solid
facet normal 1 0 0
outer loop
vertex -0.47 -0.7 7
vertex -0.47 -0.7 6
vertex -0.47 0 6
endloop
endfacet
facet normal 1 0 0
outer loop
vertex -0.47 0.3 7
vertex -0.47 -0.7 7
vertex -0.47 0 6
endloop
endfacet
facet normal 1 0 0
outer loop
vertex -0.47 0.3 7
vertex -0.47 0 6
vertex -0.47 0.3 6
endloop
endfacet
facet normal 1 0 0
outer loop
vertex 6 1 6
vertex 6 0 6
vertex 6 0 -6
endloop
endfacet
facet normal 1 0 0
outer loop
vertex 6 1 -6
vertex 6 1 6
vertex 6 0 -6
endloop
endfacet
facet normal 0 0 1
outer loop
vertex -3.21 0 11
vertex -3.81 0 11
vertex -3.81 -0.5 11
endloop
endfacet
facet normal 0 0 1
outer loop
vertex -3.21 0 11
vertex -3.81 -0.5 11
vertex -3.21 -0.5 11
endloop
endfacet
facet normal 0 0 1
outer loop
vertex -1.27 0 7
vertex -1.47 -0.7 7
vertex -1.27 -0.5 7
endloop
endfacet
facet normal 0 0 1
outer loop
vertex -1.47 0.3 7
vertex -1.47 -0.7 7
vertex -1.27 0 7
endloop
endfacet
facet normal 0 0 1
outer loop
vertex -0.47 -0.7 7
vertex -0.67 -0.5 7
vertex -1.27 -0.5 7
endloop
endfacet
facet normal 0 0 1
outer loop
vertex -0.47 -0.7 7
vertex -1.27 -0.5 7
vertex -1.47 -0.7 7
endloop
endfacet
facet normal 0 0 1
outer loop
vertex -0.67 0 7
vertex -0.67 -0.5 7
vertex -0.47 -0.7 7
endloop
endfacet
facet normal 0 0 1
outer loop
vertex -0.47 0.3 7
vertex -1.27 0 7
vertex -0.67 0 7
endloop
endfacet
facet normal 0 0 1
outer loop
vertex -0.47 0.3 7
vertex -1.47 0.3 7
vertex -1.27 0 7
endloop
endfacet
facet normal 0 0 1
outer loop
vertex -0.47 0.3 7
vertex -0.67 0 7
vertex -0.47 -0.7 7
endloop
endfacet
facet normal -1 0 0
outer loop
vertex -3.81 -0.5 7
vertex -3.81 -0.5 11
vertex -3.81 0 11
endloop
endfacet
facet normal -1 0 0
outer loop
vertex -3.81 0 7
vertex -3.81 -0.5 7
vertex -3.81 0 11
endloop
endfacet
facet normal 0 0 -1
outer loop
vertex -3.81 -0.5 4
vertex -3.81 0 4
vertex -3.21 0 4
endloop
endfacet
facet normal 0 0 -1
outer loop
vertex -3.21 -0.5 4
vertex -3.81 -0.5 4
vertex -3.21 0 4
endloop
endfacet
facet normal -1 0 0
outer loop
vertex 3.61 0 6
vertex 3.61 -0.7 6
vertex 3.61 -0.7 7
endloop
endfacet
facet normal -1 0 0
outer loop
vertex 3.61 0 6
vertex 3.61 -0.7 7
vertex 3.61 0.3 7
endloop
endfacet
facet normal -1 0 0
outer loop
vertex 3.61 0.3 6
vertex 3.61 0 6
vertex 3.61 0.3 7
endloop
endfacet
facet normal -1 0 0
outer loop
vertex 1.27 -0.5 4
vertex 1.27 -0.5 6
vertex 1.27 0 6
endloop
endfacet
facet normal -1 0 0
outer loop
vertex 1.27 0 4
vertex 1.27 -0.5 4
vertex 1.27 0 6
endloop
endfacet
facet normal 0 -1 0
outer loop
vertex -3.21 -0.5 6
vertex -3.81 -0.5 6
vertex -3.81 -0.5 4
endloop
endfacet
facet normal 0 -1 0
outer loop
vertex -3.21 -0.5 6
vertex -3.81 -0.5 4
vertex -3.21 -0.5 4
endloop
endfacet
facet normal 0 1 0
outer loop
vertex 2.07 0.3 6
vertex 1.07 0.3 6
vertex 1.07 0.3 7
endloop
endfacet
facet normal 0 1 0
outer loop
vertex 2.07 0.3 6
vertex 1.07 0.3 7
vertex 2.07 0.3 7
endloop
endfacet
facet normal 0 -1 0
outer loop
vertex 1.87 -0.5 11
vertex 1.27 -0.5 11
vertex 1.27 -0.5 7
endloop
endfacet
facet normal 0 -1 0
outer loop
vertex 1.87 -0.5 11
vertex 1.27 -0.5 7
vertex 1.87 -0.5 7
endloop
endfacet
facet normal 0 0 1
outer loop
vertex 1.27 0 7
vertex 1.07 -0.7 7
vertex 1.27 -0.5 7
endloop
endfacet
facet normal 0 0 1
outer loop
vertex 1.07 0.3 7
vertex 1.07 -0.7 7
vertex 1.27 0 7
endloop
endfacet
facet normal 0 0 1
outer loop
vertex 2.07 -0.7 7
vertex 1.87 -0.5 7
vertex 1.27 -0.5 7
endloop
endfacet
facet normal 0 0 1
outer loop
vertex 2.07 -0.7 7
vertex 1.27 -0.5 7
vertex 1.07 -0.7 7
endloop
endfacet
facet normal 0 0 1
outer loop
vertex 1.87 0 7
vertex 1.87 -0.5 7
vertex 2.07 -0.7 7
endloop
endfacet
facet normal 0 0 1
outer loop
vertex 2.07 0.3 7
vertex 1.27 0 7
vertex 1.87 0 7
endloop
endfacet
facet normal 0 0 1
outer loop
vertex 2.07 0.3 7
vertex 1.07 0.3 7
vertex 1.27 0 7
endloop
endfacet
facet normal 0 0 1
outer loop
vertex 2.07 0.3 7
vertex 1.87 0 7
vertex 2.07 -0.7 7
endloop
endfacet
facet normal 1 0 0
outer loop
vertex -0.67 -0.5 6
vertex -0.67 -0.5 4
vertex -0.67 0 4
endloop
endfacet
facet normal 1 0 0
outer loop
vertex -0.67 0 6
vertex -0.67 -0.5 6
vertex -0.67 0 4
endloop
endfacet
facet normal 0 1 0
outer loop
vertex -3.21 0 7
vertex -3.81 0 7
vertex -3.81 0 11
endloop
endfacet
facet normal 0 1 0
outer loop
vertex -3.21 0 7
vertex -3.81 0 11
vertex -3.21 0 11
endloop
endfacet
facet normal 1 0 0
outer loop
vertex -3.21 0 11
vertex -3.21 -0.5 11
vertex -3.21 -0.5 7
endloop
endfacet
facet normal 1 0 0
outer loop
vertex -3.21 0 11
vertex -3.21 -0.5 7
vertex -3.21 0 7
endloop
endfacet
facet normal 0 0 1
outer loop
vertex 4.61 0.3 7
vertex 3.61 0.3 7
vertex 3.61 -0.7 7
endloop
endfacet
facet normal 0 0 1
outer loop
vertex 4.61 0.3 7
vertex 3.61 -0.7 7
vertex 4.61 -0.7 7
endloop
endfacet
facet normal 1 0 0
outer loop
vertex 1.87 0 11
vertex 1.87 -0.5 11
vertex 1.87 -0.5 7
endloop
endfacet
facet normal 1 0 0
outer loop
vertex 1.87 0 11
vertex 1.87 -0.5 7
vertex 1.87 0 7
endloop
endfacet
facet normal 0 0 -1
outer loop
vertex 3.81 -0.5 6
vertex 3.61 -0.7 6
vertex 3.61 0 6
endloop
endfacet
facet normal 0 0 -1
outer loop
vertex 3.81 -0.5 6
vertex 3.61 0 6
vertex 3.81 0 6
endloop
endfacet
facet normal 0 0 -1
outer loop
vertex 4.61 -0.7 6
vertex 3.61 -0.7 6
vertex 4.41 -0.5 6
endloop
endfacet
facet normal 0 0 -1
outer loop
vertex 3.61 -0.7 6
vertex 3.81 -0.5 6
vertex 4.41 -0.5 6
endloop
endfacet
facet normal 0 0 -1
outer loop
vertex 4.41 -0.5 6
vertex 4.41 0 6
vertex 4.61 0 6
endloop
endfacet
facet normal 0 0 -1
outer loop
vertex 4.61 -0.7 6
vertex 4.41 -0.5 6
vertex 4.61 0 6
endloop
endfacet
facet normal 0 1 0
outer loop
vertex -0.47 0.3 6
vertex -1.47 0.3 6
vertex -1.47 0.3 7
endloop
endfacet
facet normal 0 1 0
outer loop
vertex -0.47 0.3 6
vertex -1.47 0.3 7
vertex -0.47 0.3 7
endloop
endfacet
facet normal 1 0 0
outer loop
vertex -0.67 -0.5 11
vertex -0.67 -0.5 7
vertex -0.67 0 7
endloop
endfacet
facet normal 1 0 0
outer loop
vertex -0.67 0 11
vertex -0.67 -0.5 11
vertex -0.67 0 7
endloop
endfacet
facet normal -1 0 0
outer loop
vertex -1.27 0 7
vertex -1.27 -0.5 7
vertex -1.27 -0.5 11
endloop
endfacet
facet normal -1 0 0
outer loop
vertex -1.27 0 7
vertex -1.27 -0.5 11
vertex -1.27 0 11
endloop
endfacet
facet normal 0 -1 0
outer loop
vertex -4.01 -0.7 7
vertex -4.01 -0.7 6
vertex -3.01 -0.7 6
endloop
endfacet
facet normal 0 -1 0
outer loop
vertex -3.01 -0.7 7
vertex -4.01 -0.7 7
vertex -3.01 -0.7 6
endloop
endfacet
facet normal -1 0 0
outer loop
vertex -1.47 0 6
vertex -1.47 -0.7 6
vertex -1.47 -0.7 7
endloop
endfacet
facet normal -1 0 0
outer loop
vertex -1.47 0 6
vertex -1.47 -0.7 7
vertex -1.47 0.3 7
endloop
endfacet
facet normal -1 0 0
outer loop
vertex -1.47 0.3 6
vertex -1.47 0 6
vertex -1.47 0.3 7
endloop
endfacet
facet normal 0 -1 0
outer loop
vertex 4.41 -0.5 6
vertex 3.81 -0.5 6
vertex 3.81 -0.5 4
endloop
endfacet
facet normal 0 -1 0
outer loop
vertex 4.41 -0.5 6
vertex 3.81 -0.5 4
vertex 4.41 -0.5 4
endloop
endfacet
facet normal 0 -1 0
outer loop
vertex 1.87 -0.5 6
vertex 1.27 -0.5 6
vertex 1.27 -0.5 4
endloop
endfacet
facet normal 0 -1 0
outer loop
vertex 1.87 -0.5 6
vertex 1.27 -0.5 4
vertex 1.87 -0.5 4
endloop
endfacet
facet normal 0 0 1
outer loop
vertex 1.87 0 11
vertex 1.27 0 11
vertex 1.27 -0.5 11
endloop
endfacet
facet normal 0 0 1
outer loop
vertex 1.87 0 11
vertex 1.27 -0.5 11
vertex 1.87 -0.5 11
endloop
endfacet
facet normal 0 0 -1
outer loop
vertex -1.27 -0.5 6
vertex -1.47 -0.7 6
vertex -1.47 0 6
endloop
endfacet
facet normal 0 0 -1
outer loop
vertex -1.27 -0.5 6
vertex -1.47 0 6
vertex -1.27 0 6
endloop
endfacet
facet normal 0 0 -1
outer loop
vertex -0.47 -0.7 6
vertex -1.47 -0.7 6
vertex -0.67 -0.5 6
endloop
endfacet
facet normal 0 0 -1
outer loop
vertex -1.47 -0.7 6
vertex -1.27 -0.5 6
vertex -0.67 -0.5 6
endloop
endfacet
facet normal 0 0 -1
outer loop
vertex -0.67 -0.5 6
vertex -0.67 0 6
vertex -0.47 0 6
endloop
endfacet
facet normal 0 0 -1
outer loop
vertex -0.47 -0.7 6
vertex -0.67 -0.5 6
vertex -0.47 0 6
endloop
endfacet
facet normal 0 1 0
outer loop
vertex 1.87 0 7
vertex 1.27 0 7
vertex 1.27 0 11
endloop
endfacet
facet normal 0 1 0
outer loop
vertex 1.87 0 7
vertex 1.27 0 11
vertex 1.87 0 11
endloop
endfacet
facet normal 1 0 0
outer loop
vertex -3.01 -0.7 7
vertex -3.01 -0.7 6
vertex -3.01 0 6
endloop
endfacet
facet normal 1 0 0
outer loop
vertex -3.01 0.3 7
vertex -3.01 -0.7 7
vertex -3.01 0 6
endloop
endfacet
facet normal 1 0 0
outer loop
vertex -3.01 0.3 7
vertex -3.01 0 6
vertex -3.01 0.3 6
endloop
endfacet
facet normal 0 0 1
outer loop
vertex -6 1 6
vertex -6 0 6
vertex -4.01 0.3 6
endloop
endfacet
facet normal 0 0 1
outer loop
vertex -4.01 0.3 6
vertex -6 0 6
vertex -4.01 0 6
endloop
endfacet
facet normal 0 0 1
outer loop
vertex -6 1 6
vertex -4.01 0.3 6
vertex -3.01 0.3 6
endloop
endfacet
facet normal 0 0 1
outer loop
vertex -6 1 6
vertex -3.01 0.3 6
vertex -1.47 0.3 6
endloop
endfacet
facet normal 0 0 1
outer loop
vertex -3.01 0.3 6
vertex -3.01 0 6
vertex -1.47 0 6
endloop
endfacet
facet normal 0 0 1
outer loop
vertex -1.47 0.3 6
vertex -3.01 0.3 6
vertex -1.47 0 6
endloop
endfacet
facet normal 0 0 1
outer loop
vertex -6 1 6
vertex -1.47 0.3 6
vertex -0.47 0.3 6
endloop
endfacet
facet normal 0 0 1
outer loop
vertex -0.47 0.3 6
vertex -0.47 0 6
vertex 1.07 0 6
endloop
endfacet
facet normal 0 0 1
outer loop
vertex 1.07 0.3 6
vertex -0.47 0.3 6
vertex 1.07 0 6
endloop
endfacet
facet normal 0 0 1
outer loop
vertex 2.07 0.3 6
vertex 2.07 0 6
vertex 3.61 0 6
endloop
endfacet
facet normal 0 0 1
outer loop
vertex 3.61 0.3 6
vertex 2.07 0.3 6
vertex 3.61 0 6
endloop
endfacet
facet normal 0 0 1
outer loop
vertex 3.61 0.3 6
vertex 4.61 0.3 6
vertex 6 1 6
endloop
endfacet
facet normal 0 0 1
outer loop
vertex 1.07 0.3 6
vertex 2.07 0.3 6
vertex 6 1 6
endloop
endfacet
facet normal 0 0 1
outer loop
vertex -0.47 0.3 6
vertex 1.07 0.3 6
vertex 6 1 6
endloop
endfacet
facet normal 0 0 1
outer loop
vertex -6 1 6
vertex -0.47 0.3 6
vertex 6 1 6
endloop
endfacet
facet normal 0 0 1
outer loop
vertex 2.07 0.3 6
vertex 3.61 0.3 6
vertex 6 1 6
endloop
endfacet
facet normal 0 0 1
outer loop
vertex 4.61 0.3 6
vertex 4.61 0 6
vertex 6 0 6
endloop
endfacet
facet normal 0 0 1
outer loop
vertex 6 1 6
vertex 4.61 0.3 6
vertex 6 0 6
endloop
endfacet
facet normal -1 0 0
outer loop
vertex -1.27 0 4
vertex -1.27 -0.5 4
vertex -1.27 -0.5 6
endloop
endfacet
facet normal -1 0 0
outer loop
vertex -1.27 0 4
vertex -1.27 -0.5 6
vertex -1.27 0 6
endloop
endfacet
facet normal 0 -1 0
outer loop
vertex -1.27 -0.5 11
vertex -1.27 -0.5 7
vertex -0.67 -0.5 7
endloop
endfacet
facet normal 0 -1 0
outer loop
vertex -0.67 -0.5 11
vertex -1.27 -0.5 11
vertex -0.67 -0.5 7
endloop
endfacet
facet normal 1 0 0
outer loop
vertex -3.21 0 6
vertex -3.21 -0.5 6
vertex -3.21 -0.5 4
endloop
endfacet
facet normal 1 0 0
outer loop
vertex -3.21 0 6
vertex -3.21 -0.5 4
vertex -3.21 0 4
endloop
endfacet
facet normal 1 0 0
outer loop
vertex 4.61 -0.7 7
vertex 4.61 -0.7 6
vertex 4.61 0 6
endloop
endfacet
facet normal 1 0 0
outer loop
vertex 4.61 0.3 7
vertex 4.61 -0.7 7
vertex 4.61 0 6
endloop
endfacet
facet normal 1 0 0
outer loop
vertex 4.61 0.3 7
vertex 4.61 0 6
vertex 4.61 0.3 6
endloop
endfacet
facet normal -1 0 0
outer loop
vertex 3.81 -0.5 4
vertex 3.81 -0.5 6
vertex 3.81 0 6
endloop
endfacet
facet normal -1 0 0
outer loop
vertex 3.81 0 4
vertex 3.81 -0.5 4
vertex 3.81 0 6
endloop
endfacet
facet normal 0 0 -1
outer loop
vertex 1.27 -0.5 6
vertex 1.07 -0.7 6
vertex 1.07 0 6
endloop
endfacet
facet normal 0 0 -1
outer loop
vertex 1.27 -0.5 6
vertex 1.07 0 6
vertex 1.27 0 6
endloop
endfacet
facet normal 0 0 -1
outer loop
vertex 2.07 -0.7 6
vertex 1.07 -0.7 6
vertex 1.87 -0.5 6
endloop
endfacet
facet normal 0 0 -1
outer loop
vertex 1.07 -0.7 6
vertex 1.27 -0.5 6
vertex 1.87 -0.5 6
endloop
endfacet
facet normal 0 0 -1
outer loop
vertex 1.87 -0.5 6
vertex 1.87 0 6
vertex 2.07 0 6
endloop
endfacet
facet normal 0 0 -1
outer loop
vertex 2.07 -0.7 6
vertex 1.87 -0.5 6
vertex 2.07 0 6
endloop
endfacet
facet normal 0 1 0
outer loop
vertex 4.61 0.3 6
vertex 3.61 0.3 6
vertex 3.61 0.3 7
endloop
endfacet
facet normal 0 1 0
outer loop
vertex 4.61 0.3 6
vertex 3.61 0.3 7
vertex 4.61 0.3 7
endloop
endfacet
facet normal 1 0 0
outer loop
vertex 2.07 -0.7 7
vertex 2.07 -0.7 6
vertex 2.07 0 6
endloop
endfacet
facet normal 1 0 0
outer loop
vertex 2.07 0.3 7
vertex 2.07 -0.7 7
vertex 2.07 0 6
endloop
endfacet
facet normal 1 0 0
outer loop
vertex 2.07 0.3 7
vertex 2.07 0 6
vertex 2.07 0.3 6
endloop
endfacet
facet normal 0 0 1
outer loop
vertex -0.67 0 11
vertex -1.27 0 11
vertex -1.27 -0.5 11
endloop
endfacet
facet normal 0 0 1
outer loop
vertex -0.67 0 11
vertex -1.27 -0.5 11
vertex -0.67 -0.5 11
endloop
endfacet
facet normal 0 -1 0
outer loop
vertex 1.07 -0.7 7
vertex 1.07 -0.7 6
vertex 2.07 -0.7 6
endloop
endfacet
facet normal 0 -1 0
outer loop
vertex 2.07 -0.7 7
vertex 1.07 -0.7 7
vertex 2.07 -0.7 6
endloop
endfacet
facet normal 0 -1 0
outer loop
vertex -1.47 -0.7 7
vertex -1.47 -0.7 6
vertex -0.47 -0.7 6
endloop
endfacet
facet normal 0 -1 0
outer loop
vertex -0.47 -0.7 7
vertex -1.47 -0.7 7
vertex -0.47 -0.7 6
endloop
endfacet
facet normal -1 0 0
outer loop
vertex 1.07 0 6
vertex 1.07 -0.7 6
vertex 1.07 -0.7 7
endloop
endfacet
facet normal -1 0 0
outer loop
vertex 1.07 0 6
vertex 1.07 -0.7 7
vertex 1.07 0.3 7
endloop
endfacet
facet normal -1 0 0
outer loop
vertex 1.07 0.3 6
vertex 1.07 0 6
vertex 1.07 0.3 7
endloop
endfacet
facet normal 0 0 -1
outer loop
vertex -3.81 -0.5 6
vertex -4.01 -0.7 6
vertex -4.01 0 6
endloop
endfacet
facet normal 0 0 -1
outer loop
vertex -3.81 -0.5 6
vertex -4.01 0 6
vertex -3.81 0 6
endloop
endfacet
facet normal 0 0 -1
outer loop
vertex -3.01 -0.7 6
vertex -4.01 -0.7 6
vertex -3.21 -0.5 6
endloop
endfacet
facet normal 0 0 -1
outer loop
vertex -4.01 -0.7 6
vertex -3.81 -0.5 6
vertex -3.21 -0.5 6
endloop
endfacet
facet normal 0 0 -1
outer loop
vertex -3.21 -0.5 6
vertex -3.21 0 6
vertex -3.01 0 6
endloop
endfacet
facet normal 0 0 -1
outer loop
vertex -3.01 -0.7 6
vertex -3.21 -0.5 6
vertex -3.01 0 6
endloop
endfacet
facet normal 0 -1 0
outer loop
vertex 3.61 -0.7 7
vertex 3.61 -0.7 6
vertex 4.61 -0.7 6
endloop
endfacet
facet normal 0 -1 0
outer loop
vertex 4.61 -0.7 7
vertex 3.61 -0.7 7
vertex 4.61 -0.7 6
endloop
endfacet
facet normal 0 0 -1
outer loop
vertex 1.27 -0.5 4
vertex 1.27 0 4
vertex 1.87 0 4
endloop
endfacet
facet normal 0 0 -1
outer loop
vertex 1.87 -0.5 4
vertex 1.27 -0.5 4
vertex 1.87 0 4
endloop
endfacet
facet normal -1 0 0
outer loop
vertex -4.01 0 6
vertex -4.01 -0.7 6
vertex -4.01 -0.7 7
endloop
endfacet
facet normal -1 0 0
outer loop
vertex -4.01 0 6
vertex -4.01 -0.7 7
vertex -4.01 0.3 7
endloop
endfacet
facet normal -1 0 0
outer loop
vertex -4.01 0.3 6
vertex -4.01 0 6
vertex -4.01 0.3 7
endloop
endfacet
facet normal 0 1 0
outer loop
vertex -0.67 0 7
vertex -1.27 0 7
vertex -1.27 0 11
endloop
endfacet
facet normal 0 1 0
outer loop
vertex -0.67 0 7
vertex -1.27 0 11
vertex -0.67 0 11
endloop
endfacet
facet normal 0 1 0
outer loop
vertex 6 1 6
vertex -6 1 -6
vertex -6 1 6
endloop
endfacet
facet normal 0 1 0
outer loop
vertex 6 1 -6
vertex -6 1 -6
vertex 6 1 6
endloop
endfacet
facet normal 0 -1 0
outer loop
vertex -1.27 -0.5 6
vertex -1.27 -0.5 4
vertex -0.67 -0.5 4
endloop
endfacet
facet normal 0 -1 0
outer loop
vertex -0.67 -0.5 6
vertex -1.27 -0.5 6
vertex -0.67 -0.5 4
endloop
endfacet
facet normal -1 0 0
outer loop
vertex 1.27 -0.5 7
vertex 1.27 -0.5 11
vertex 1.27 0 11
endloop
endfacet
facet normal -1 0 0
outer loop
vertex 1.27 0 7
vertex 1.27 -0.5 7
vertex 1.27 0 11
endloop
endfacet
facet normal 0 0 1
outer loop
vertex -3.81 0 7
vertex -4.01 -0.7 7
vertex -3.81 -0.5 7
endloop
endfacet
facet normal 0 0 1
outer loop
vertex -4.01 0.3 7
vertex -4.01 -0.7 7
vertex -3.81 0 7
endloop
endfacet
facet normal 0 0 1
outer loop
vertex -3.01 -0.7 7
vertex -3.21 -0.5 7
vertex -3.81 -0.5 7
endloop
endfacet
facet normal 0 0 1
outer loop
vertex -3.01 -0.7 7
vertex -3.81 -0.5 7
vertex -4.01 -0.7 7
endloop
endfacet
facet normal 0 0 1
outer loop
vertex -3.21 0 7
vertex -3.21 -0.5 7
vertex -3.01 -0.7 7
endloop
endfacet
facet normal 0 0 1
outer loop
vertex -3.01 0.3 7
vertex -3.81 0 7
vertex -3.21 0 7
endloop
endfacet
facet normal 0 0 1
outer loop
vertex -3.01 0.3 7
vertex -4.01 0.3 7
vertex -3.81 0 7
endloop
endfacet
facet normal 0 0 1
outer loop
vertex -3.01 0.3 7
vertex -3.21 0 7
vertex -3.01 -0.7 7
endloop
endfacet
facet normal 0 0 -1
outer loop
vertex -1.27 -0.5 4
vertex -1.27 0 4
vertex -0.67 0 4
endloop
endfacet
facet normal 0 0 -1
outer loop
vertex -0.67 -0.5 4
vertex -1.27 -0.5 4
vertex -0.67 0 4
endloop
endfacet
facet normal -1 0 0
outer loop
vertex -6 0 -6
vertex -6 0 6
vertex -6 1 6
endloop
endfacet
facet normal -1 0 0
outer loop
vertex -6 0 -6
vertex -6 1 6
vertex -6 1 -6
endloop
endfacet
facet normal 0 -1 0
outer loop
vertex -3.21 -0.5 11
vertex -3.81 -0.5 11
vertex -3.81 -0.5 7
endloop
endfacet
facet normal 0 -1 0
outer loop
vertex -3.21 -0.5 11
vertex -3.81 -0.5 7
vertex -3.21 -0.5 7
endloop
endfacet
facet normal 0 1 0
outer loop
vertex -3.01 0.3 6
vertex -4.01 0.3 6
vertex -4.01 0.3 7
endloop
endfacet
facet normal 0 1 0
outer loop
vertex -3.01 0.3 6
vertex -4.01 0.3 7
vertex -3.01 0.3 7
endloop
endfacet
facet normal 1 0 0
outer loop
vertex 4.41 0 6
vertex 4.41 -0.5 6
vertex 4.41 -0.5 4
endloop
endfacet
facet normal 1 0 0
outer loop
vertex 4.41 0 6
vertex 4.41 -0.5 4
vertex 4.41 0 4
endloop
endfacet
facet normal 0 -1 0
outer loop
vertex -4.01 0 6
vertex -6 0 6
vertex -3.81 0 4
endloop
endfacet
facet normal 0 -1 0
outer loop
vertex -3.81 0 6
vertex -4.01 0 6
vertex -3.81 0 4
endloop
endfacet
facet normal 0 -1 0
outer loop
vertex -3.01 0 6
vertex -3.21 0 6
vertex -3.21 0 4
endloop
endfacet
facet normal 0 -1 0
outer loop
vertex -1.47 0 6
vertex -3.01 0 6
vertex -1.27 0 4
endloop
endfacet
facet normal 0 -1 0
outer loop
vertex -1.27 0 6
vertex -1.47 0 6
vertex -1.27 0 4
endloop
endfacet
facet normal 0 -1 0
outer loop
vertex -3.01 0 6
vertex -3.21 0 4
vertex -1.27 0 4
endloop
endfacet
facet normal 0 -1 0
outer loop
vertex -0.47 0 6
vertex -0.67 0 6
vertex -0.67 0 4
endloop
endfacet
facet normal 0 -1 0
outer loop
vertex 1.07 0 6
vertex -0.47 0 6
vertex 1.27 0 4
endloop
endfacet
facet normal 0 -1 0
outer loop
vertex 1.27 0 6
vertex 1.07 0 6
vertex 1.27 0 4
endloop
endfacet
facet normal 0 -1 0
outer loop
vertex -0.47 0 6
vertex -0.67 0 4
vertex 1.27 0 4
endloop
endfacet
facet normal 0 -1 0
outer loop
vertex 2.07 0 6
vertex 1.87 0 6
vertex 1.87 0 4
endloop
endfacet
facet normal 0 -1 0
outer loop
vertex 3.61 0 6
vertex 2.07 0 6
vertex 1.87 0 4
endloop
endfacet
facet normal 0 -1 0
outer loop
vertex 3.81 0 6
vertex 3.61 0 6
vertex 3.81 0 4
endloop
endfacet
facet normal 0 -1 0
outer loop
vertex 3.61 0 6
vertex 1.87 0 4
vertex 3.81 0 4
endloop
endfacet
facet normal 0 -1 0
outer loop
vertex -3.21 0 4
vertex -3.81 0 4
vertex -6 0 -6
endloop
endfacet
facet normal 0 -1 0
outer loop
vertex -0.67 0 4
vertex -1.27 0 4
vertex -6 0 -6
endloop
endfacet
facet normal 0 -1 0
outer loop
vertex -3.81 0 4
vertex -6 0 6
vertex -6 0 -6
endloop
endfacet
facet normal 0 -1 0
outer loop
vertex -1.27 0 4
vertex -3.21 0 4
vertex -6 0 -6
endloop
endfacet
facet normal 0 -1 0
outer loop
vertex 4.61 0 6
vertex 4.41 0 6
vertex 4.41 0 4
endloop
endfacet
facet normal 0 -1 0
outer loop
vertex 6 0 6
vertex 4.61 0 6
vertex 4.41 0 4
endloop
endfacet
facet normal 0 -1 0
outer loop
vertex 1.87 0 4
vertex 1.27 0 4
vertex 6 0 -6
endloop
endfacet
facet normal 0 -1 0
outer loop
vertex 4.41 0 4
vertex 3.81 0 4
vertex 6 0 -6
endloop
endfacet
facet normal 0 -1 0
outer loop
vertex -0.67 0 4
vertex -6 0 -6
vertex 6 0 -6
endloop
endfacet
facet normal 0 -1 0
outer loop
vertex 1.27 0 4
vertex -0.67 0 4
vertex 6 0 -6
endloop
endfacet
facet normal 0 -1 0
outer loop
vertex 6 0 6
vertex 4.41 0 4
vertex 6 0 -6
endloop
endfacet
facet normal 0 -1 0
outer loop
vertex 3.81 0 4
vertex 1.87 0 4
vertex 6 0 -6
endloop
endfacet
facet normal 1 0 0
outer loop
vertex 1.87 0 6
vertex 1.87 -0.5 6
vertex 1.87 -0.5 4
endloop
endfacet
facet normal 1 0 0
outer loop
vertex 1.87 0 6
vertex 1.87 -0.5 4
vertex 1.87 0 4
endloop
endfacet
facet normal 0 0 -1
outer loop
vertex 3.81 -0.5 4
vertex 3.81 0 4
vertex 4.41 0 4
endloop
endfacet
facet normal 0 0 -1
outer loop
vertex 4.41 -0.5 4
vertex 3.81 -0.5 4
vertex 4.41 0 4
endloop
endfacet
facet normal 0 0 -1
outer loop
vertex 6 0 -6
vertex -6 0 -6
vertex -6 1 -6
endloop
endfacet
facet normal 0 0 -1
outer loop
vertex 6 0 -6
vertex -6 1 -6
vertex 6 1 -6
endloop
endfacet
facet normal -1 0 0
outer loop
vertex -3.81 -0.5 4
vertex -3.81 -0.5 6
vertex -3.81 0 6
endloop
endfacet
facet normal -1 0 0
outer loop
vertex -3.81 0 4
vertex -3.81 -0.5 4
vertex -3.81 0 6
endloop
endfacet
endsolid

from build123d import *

# Parameters (mm, degrees)
SKETCH1_W           = 12
SKETCH1_H           = 12
BOSS_EXTRUDE1_DEPTH = 1
SKETCH2_W           = 0.6
SKETCH2_H           = 0.5
BOSS_EXTRUDE2_DEPTH = 5
SKETCH2_3_W         = 0.6
SKETCH2_3_H         = 0.5
BOSS_EXTRUDE3_DEPTH = 2
LPATTERN2_COUNT     = 4
LPATTERN2_PITCH     = 2.54
LPATTERN3_COUNT     = 3
LPATTERN3_PITCH     = 2.54
SKETCH3_W           = 1
SKETCH3_H           = 1
BOSS_EXTRUDE4_DEPTH = 1
LPATTERN4_COUNT     = 4
LPATTERN4_PITCH     = 2.54


with BuildPart() as part:
    # Sketch1 → Boss-Extrude1 (new body)
    with BuildSketch(Plane(origin=(0, 0, 0), x_dir=(1, 0, 0), z_dir=(0, 1, 0))):
        Rectangle(SKETCH1_W, SKETCH1_H)
    extrude(amount=BOSS_EXTRUDE1_DEPTH)



with BuildPart() as body_2:
    # Sketch2 → Boss-Extrude2 (new body)
    with BuildSketch(Plane.XY.offset(6)):
        with Locations((-3.51, -0.25)):
            Rectangle(SKETCH2_W, SKETCH2_H)
    boss_extrude2 = extrude(amount=BOSS_EXTRUDE2_DEPTH)


with BuildPart() as part_1:
    add(part.part)

    add(body_2.part)  # Boss-Extrude3 merges body 2
    # Sketch2<3> → Boss-Extrude3 (add)
    with BuildSketch(Plane.XY.offset(6)):
        with Locations((-3.51, -0.25)):
            Rectangle(SKETCH2_3_W, SKETCH2_3_H)
    boss_extrude3 = extrude(amount=-BOSS_EXTRUDE3_DEPTH)

    # LPattern2: Boss-Extrude3 ×4
    with Locations(*[(i * LPATTERN2_PITCH, 0, 0) for i in range(1, LPATTERN2_COUNT)]):
        add(boss_extrude3)

    # LPattern3: Boss-Extrude2 ×3
    with Locations(*[(i * LPATTERN3_PITCH, 0, 0) for i in range(1, LPATTERN3_COUNT)]):
        add(boss_extrude2)

    # Sketch3 → Boss-Extrude4 (add)
    with BuildSketch(Plane.XY.offset(6)):
        with Locations((4.11, -0.2)):
            Rectangle(SKETCH3_W, SKETCH3_H)
    boss_extrude4 = extrude(amount=BOSS_EXTRUDE4_DEPTH)

    # LPattern4: Boss-Extrude4 ×4
    with Locations(*[(-i * LPATTERN4_PITCH, 0, 0) for i in range(1, LPATTERN4_COUNT)]):
        add(boss_extrude4)


solid = part_1.part
